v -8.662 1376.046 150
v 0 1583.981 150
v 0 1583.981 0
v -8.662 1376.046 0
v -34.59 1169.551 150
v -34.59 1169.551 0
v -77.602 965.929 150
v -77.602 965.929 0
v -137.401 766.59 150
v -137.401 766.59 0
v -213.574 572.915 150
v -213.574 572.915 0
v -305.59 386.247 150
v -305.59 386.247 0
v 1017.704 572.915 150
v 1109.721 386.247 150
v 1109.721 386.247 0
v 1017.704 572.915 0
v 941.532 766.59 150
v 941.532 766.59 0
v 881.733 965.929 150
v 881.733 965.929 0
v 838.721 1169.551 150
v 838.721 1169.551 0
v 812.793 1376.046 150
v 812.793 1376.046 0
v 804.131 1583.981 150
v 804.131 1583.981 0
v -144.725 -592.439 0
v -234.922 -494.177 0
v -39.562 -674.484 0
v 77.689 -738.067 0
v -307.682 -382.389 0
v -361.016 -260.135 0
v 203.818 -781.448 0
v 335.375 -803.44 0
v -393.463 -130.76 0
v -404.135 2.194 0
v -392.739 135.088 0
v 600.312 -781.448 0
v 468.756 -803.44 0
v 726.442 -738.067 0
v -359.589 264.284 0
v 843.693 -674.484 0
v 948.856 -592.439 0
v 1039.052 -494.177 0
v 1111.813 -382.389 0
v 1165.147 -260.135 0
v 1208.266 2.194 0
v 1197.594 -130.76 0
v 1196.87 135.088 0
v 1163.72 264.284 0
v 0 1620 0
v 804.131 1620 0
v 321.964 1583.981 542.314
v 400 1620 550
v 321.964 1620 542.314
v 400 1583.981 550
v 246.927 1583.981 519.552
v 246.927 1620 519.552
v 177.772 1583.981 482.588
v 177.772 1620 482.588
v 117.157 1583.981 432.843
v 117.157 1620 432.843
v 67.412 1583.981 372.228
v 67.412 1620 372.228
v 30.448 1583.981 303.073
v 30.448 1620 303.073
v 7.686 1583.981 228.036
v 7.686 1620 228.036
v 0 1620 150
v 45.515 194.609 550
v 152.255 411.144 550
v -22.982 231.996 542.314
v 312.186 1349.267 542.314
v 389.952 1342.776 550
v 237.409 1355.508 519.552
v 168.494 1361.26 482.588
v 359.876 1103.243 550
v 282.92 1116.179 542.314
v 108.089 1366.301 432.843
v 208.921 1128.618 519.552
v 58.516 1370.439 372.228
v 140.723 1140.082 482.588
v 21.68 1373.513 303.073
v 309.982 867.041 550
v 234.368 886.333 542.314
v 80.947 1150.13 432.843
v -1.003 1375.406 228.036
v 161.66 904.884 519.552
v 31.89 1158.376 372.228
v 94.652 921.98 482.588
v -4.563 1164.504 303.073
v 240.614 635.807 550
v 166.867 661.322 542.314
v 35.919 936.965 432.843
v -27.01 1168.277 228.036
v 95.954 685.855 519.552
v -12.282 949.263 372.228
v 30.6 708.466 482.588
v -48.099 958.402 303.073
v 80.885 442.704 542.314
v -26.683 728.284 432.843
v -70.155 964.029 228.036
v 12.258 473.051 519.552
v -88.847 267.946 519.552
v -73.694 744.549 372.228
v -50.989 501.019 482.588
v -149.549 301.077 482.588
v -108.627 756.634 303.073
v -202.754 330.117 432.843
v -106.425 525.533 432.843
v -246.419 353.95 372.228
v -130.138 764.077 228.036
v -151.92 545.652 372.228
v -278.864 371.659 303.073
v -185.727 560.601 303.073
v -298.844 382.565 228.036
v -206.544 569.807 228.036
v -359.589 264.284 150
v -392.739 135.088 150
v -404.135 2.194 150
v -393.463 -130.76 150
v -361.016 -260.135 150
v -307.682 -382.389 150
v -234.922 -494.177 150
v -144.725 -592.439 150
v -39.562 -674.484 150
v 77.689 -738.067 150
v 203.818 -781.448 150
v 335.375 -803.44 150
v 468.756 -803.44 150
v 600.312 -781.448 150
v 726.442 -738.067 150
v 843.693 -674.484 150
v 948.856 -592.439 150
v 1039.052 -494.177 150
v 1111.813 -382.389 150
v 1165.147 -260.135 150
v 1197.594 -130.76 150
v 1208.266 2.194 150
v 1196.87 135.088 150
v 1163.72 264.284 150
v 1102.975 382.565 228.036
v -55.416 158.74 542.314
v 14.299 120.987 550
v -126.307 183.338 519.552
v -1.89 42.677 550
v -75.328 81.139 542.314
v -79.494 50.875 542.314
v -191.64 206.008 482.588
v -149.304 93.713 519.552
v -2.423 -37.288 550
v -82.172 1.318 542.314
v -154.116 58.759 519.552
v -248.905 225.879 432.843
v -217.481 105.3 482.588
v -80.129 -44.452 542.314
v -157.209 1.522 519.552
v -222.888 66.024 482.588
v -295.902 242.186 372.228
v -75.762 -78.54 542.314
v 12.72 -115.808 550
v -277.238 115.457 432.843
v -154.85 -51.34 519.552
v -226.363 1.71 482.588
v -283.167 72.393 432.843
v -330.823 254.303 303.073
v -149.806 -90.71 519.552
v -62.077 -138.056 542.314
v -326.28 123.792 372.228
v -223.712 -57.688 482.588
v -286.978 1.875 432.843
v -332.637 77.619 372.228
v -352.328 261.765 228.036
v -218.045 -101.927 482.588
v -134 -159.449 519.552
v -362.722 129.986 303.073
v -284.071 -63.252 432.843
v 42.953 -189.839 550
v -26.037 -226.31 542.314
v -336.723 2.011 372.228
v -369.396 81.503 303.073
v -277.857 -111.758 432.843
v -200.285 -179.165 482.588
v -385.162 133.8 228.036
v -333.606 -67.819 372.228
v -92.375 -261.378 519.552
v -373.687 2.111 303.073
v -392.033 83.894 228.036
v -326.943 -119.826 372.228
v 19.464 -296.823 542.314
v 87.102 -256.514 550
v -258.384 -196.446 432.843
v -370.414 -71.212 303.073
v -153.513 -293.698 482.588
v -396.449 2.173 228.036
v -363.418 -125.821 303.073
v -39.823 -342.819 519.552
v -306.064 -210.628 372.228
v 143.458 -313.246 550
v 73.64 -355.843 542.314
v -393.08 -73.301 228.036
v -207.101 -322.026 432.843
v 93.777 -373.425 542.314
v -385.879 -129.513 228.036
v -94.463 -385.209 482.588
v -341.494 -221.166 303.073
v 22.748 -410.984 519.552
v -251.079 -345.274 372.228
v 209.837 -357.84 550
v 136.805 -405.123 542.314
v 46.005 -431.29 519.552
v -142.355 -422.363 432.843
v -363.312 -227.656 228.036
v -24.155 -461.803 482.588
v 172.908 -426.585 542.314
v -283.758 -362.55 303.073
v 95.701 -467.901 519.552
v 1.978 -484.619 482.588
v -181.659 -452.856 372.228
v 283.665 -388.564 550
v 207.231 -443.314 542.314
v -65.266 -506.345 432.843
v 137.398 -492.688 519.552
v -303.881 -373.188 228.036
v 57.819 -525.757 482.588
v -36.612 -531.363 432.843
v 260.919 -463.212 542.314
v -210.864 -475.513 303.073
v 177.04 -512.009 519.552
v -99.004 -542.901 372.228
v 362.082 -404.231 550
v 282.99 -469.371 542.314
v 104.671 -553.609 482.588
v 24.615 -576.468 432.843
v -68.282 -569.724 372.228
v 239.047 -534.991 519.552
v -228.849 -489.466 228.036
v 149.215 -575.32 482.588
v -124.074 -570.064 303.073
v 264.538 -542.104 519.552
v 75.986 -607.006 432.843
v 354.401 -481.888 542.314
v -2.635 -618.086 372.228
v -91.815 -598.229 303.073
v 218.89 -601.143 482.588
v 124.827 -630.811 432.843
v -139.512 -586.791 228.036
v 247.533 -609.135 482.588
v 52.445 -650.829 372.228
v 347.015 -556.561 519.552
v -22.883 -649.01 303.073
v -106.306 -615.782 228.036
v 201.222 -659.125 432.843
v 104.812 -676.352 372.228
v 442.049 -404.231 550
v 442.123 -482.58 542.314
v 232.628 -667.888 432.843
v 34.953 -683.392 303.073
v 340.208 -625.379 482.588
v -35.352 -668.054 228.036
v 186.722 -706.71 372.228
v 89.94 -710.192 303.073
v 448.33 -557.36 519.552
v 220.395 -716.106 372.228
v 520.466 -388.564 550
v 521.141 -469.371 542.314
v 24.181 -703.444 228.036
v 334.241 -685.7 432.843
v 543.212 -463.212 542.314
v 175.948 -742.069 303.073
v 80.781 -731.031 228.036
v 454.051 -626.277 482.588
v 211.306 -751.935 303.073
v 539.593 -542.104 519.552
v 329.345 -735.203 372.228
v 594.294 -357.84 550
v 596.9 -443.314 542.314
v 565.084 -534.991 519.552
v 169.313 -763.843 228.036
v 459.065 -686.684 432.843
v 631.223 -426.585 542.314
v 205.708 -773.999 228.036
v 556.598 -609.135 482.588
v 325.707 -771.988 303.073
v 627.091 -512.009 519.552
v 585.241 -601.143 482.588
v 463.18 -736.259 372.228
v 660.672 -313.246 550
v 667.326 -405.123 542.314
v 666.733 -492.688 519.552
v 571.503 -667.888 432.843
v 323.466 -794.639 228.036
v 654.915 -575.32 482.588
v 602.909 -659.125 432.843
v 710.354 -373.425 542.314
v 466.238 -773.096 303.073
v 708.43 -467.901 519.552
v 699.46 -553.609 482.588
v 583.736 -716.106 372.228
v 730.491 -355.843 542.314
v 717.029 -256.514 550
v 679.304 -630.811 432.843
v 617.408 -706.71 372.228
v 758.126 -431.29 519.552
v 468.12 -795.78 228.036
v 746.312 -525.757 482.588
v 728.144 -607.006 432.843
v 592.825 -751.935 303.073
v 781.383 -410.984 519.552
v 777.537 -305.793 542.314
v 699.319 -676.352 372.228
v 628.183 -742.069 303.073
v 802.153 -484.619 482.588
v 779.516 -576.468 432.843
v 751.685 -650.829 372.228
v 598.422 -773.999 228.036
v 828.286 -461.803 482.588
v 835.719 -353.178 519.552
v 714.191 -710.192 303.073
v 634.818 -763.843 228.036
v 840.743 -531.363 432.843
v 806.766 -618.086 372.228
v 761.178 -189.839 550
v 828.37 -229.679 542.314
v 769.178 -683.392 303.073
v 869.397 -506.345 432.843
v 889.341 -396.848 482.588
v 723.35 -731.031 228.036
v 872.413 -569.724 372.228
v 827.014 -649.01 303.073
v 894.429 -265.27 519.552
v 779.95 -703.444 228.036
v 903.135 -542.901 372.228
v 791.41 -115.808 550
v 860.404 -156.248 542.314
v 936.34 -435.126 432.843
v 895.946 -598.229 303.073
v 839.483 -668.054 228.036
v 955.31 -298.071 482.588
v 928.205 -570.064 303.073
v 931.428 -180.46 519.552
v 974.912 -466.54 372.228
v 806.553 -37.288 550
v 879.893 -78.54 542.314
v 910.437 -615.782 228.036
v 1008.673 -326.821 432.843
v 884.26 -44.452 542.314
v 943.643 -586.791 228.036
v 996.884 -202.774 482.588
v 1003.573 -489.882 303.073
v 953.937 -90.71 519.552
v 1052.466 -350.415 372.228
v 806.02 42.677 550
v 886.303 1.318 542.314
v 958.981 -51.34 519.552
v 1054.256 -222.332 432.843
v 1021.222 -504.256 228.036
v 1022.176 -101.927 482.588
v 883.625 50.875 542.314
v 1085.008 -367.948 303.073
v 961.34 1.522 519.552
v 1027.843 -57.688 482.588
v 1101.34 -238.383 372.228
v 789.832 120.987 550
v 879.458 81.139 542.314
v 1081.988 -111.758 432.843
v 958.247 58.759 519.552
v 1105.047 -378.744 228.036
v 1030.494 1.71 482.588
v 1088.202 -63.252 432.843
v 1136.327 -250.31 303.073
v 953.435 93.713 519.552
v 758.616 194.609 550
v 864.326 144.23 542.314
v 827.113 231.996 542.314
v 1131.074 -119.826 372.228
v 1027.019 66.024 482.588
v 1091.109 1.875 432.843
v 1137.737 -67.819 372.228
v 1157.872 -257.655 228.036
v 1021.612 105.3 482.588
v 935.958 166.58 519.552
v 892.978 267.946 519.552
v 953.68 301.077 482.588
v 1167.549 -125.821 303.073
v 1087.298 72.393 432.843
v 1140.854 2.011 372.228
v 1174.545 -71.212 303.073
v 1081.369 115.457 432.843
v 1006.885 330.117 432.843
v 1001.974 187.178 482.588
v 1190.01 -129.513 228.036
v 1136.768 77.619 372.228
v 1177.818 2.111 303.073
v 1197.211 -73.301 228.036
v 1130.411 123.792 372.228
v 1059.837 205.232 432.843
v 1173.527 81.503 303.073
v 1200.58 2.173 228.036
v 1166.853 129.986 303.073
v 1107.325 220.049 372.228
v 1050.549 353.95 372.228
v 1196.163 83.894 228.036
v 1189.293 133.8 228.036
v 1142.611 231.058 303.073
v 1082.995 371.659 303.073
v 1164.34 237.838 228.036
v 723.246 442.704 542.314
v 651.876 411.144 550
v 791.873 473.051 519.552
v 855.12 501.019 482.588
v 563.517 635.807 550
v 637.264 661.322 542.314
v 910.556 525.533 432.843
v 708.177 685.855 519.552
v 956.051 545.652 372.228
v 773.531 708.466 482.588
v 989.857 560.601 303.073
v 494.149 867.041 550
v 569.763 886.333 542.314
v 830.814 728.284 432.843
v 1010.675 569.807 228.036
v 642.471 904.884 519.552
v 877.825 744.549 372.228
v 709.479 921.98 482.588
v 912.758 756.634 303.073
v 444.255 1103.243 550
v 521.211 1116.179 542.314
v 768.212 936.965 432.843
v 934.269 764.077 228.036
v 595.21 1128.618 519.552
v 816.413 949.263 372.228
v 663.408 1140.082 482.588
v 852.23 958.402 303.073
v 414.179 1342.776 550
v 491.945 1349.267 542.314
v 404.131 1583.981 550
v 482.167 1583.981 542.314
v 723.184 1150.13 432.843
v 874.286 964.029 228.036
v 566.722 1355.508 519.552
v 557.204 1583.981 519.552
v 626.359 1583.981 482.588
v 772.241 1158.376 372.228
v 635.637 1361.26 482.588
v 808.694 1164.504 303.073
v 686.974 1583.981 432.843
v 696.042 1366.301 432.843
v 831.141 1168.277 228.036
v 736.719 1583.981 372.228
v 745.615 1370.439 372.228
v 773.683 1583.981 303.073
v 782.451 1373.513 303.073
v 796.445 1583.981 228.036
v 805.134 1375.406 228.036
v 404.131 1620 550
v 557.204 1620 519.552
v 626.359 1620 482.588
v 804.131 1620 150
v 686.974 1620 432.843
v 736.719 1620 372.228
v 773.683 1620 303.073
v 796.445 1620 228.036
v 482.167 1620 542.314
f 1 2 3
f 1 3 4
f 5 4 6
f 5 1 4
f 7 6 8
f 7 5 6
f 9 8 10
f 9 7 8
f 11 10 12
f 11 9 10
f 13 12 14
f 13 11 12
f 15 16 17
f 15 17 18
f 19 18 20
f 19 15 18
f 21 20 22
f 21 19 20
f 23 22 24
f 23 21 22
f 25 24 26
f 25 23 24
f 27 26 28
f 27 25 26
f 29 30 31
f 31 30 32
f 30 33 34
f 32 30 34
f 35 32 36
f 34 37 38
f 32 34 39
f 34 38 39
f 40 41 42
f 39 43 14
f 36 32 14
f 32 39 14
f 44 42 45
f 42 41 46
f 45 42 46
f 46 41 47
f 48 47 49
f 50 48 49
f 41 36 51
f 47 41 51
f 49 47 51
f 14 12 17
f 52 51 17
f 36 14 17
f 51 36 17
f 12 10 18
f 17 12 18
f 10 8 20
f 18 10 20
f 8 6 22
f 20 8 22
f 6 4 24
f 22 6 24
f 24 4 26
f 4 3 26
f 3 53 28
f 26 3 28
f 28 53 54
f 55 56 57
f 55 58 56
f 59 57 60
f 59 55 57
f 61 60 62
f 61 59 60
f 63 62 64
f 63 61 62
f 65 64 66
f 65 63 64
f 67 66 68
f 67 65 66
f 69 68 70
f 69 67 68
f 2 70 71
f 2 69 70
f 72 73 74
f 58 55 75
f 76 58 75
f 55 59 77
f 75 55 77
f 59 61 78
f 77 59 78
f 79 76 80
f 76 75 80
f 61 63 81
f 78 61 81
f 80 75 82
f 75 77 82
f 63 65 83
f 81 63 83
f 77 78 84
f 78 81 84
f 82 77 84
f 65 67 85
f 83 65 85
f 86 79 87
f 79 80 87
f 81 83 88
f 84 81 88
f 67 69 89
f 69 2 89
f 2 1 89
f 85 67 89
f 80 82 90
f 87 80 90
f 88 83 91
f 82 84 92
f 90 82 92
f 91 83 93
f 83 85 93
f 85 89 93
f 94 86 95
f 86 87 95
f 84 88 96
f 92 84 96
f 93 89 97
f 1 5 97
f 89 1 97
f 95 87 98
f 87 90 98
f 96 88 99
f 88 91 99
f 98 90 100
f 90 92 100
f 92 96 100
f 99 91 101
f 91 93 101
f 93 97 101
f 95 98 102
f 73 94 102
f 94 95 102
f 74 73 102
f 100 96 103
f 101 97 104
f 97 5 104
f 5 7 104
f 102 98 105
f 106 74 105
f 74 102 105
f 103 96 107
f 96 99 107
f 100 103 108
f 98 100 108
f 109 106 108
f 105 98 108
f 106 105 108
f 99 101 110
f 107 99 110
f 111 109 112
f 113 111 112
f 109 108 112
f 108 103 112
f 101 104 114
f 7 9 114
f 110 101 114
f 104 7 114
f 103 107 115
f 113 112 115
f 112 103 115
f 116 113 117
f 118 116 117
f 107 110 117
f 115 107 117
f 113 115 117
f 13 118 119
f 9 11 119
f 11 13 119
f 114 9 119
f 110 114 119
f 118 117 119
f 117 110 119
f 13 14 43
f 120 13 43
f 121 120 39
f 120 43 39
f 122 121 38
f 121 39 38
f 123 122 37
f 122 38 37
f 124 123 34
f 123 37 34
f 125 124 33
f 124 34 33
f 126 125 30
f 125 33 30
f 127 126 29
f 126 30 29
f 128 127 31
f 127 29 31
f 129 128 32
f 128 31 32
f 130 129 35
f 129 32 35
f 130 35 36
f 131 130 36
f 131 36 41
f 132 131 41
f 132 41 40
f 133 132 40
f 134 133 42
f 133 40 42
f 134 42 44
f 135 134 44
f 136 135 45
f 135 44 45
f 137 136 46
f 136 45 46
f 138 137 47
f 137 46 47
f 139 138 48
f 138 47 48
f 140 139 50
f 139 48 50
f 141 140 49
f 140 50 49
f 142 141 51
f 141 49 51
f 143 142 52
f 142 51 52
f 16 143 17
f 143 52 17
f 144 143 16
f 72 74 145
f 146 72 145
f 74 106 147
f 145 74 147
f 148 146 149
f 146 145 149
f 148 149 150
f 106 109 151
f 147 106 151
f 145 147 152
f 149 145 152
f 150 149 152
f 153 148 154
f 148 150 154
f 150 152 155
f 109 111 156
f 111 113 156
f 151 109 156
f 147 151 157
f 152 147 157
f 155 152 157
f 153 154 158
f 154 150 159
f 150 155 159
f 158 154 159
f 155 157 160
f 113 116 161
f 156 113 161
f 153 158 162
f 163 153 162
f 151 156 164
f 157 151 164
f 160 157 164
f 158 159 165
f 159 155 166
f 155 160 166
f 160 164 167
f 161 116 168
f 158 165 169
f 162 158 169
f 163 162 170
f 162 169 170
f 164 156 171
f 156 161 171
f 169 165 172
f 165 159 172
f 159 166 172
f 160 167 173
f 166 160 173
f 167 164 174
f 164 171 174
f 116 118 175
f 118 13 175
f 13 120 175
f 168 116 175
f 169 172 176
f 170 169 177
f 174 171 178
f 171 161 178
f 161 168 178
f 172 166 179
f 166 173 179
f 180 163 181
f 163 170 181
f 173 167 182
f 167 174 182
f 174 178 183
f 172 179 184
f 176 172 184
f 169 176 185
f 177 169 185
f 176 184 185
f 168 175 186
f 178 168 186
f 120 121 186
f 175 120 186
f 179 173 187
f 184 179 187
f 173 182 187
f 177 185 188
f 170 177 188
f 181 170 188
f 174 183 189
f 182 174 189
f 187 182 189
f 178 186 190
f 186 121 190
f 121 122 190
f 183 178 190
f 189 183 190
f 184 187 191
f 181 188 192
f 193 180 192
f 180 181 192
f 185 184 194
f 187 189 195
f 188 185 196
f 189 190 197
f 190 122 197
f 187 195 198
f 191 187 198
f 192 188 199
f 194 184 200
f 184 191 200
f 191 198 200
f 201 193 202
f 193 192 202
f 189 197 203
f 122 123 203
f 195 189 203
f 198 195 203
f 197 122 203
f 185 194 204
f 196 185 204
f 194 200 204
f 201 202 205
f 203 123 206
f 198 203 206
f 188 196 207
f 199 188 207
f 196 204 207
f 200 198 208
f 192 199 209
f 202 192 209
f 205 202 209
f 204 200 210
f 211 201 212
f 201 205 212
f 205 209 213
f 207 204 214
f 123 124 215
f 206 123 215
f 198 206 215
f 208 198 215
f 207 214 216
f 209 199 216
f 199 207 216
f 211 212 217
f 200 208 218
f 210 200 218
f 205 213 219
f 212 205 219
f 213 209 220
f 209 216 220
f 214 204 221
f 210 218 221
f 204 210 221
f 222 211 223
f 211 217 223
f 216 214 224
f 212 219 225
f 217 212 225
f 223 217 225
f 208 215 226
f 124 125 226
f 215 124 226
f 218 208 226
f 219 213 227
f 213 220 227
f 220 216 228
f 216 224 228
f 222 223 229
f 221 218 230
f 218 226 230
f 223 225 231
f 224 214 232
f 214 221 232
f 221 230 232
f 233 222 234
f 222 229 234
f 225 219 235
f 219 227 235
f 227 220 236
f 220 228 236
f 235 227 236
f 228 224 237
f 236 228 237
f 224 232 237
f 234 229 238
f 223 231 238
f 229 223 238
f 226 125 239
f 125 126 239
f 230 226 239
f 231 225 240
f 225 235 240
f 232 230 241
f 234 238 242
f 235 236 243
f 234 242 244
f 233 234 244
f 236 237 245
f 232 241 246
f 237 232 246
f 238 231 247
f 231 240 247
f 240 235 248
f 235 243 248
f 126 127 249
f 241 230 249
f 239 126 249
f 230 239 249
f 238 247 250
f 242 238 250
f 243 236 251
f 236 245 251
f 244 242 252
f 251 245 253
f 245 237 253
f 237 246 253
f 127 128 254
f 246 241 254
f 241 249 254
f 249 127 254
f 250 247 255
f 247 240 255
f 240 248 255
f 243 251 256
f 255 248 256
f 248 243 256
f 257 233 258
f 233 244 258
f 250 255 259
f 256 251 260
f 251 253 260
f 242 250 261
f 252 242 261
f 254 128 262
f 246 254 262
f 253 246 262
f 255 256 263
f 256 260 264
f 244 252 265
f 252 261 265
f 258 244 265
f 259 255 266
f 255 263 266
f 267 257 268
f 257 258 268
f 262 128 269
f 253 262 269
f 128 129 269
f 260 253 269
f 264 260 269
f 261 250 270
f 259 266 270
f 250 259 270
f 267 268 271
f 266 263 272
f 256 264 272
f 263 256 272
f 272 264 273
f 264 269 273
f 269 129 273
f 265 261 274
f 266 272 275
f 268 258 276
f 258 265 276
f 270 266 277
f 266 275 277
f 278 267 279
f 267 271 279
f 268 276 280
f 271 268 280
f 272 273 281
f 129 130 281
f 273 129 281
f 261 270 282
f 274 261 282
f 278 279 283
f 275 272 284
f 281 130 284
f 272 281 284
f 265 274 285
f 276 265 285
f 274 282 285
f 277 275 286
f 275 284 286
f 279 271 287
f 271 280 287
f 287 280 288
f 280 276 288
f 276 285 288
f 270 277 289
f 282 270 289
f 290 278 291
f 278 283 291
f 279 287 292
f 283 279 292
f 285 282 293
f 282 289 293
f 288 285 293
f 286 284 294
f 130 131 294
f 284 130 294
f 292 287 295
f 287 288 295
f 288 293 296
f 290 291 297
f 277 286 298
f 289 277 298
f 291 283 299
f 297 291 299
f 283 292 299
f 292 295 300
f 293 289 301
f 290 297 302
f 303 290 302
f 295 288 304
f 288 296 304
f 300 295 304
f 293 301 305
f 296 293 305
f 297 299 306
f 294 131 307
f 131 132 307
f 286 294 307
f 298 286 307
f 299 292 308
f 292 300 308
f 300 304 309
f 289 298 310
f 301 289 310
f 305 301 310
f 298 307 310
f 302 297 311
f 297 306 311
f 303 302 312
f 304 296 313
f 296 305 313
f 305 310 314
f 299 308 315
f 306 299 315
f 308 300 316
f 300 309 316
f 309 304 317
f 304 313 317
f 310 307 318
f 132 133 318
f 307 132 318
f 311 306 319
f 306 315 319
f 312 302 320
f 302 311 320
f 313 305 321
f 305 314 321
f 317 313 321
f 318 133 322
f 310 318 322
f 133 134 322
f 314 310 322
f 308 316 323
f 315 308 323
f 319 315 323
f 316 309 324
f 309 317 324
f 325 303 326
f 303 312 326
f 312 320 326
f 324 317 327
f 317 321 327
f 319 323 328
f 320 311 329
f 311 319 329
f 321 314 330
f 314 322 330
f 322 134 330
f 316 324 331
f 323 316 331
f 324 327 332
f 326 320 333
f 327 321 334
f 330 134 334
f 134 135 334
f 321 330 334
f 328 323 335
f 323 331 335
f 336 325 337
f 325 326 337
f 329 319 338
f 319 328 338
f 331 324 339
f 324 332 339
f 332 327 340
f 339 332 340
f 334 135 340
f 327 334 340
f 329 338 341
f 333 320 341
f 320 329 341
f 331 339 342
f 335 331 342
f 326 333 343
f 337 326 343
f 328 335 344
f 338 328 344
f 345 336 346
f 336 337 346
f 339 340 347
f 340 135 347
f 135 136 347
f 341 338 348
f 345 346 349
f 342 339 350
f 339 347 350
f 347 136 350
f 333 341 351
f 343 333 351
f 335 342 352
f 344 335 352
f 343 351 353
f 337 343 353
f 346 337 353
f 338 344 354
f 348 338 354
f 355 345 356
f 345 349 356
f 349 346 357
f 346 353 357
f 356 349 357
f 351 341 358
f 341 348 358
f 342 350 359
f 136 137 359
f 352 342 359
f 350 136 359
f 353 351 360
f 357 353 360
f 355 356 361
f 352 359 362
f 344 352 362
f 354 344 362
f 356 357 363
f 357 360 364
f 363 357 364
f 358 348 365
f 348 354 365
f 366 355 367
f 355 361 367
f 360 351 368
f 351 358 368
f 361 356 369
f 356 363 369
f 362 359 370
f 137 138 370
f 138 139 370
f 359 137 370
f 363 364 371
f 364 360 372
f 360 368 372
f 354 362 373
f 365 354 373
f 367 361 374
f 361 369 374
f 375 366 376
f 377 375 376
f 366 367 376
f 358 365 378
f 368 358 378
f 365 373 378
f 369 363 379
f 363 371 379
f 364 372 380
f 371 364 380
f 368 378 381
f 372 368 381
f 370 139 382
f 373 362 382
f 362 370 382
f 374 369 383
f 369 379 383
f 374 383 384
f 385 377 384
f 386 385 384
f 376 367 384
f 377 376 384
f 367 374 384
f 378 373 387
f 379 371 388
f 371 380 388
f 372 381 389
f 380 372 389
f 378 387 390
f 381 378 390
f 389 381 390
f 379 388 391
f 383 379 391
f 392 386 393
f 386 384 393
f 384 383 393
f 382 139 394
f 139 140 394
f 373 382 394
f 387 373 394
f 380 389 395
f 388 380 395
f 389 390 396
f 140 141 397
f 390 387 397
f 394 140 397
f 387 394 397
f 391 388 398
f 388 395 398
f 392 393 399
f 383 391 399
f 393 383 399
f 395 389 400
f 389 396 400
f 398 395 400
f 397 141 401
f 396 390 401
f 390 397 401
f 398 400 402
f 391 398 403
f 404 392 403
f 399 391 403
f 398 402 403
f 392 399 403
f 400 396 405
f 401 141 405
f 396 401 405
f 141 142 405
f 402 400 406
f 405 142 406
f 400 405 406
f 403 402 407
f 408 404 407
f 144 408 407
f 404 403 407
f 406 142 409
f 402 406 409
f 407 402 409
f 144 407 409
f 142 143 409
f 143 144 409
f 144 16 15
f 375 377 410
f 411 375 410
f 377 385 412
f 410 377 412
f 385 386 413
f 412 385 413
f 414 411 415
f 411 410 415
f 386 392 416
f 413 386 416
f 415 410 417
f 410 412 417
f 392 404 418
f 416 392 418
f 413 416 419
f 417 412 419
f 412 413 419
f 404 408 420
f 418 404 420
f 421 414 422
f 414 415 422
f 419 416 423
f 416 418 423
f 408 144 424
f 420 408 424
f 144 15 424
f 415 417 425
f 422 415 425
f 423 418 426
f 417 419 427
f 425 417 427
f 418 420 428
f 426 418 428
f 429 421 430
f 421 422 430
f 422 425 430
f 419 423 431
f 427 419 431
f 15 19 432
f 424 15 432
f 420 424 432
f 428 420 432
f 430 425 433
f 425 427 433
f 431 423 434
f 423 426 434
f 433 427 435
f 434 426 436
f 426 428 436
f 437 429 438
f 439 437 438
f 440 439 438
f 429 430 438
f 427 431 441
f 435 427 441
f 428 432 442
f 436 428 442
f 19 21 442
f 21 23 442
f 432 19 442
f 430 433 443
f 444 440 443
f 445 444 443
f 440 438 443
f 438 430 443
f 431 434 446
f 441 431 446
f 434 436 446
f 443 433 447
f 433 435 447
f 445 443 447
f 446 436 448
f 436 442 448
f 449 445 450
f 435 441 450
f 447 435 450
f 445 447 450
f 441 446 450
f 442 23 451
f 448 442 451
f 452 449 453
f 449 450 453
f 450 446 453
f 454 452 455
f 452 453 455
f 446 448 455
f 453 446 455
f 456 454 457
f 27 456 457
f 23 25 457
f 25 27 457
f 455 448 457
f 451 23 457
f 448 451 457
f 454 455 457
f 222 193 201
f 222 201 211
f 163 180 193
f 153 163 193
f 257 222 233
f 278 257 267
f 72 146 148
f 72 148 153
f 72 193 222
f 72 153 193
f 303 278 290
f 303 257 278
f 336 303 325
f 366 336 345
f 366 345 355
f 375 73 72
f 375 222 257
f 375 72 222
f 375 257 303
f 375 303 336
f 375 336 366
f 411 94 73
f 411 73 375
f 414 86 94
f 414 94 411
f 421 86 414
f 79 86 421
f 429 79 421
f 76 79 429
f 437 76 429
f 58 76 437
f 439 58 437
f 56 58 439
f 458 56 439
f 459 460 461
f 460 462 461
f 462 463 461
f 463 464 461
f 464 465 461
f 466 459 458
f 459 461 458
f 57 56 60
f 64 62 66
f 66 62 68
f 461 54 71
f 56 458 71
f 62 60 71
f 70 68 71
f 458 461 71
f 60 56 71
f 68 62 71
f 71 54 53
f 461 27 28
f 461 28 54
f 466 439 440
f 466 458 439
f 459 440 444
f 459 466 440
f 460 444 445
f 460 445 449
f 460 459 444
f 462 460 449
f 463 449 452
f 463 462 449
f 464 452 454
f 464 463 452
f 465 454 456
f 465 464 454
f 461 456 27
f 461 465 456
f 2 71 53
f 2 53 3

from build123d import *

# Parameters (mm, degrees)
F1_DEPTH = 550
F2_R     = 2500
F3_R     = 400


with BuildPart() as f1:
    # F0 (on Top) → F1 (new body)
    with BuildSketch(Plane.XY):
        with BuildLine():
            Line((0, 1620), (0, 698.7895697045))
            ThreePointArc((0, 698.7895697044), (402.0654375, 806.203125), (804.130875, 698.7895697044))
            Line((804.130875, 698.7895697044), (804.130875, 1620))
            Line((804.130875, 1620), (0, 1620))
        make_face()
        with BuildLine():
            Line((0, 698.7895697045), (0, 0))
            Line((0, 0), (804.130875, 0))
            Line((804.130875, 0), (804.130875, 698.7895697044))
            ThreePointArc((804.130875, 698.7895697044), (402.0654375, 806.203125), (0, 698.7895697044))
        make_face()
        with BuildLine():
            Line((804.130875, 0), (0, 0))
            Line((0, 0), (0, 698.7895697045))
            ThreePointArc((0, 698.7895697044), (-1.5538550225, -697.8932192416), (1208.2685625, 0))
            ThreePointArc((1208.2685625, 0), (1099.9586567416, 403.6192925225), (804.130875, 698.7895697044))
            Line((804.130875, 698.7895697044), (804.130875, 0))
        make_face()
    extrude(amount=F1_DEPTH)

    # F2
    f2_edges = [f1.edges().sort_by_distance(p)[0] for p in [
        (0, 698.78957, 275),
        (804.130875, 698.78957, 275),
    ]]
    fillet(f2_edges, radius=F2_R)

    # F3
    f3_edges = [f1.edges().sort_by_distance(p)[0] for p in [
        (881.732912, 965.928975, 550),
        (402.065437, -806.203125, 550),
        (-77.602037, 965.928975, 550),
    ]]
    fillet(f3_edges, radius=F3_R)


solid = f1.part
